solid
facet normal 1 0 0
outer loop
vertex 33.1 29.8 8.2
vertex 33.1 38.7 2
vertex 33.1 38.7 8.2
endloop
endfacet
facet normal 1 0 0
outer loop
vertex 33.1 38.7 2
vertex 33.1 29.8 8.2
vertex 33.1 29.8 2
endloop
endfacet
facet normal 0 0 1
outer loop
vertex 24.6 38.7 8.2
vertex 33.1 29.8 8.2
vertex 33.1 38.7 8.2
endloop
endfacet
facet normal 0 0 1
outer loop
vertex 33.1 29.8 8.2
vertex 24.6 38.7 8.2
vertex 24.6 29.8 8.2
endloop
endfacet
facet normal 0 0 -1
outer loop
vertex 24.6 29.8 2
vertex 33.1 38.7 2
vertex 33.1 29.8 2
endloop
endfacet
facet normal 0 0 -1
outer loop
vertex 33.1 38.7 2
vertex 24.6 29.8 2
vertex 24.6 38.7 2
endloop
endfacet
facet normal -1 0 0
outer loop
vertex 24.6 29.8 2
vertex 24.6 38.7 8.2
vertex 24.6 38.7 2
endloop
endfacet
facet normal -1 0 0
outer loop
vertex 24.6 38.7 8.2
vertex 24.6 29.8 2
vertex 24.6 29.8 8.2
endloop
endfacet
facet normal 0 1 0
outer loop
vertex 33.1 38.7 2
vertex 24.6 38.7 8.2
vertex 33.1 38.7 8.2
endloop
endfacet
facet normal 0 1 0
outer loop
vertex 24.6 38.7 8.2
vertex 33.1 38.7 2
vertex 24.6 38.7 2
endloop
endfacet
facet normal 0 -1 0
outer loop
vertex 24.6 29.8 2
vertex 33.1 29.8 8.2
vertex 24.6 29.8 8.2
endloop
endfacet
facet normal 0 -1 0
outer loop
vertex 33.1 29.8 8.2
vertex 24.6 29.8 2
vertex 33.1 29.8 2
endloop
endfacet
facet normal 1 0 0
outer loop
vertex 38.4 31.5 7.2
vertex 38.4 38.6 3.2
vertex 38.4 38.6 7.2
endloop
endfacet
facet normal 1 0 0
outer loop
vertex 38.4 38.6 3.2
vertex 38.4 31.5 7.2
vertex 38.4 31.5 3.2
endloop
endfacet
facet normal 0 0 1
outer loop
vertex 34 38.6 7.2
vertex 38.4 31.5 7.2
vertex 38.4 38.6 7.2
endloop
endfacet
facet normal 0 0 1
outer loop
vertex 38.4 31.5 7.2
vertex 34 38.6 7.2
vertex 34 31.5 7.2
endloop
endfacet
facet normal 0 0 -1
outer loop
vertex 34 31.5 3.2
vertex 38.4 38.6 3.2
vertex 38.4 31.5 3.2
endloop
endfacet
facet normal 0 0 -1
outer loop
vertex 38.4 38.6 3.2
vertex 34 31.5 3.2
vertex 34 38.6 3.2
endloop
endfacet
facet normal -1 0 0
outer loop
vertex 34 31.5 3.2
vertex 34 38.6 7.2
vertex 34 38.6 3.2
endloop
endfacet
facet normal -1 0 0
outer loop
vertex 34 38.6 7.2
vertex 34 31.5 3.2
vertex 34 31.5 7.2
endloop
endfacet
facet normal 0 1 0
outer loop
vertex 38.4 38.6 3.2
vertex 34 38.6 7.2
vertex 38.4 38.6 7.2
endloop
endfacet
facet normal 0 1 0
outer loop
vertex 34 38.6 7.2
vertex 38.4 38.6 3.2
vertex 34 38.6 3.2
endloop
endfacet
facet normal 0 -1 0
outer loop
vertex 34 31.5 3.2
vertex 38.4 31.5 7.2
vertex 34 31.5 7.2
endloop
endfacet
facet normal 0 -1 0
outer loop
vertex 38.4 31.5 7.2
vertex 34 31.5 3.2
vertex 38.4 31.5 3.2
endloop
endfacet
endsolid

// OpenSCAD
union() {
  translate([24.6, 29.8, 2.0]) cube(size=[8.5,8.9,6.2], center=false);
  translate([34.0, 31.5, 3.2]) cube(size=[4.4,7.1,4.0], center=false);
}
